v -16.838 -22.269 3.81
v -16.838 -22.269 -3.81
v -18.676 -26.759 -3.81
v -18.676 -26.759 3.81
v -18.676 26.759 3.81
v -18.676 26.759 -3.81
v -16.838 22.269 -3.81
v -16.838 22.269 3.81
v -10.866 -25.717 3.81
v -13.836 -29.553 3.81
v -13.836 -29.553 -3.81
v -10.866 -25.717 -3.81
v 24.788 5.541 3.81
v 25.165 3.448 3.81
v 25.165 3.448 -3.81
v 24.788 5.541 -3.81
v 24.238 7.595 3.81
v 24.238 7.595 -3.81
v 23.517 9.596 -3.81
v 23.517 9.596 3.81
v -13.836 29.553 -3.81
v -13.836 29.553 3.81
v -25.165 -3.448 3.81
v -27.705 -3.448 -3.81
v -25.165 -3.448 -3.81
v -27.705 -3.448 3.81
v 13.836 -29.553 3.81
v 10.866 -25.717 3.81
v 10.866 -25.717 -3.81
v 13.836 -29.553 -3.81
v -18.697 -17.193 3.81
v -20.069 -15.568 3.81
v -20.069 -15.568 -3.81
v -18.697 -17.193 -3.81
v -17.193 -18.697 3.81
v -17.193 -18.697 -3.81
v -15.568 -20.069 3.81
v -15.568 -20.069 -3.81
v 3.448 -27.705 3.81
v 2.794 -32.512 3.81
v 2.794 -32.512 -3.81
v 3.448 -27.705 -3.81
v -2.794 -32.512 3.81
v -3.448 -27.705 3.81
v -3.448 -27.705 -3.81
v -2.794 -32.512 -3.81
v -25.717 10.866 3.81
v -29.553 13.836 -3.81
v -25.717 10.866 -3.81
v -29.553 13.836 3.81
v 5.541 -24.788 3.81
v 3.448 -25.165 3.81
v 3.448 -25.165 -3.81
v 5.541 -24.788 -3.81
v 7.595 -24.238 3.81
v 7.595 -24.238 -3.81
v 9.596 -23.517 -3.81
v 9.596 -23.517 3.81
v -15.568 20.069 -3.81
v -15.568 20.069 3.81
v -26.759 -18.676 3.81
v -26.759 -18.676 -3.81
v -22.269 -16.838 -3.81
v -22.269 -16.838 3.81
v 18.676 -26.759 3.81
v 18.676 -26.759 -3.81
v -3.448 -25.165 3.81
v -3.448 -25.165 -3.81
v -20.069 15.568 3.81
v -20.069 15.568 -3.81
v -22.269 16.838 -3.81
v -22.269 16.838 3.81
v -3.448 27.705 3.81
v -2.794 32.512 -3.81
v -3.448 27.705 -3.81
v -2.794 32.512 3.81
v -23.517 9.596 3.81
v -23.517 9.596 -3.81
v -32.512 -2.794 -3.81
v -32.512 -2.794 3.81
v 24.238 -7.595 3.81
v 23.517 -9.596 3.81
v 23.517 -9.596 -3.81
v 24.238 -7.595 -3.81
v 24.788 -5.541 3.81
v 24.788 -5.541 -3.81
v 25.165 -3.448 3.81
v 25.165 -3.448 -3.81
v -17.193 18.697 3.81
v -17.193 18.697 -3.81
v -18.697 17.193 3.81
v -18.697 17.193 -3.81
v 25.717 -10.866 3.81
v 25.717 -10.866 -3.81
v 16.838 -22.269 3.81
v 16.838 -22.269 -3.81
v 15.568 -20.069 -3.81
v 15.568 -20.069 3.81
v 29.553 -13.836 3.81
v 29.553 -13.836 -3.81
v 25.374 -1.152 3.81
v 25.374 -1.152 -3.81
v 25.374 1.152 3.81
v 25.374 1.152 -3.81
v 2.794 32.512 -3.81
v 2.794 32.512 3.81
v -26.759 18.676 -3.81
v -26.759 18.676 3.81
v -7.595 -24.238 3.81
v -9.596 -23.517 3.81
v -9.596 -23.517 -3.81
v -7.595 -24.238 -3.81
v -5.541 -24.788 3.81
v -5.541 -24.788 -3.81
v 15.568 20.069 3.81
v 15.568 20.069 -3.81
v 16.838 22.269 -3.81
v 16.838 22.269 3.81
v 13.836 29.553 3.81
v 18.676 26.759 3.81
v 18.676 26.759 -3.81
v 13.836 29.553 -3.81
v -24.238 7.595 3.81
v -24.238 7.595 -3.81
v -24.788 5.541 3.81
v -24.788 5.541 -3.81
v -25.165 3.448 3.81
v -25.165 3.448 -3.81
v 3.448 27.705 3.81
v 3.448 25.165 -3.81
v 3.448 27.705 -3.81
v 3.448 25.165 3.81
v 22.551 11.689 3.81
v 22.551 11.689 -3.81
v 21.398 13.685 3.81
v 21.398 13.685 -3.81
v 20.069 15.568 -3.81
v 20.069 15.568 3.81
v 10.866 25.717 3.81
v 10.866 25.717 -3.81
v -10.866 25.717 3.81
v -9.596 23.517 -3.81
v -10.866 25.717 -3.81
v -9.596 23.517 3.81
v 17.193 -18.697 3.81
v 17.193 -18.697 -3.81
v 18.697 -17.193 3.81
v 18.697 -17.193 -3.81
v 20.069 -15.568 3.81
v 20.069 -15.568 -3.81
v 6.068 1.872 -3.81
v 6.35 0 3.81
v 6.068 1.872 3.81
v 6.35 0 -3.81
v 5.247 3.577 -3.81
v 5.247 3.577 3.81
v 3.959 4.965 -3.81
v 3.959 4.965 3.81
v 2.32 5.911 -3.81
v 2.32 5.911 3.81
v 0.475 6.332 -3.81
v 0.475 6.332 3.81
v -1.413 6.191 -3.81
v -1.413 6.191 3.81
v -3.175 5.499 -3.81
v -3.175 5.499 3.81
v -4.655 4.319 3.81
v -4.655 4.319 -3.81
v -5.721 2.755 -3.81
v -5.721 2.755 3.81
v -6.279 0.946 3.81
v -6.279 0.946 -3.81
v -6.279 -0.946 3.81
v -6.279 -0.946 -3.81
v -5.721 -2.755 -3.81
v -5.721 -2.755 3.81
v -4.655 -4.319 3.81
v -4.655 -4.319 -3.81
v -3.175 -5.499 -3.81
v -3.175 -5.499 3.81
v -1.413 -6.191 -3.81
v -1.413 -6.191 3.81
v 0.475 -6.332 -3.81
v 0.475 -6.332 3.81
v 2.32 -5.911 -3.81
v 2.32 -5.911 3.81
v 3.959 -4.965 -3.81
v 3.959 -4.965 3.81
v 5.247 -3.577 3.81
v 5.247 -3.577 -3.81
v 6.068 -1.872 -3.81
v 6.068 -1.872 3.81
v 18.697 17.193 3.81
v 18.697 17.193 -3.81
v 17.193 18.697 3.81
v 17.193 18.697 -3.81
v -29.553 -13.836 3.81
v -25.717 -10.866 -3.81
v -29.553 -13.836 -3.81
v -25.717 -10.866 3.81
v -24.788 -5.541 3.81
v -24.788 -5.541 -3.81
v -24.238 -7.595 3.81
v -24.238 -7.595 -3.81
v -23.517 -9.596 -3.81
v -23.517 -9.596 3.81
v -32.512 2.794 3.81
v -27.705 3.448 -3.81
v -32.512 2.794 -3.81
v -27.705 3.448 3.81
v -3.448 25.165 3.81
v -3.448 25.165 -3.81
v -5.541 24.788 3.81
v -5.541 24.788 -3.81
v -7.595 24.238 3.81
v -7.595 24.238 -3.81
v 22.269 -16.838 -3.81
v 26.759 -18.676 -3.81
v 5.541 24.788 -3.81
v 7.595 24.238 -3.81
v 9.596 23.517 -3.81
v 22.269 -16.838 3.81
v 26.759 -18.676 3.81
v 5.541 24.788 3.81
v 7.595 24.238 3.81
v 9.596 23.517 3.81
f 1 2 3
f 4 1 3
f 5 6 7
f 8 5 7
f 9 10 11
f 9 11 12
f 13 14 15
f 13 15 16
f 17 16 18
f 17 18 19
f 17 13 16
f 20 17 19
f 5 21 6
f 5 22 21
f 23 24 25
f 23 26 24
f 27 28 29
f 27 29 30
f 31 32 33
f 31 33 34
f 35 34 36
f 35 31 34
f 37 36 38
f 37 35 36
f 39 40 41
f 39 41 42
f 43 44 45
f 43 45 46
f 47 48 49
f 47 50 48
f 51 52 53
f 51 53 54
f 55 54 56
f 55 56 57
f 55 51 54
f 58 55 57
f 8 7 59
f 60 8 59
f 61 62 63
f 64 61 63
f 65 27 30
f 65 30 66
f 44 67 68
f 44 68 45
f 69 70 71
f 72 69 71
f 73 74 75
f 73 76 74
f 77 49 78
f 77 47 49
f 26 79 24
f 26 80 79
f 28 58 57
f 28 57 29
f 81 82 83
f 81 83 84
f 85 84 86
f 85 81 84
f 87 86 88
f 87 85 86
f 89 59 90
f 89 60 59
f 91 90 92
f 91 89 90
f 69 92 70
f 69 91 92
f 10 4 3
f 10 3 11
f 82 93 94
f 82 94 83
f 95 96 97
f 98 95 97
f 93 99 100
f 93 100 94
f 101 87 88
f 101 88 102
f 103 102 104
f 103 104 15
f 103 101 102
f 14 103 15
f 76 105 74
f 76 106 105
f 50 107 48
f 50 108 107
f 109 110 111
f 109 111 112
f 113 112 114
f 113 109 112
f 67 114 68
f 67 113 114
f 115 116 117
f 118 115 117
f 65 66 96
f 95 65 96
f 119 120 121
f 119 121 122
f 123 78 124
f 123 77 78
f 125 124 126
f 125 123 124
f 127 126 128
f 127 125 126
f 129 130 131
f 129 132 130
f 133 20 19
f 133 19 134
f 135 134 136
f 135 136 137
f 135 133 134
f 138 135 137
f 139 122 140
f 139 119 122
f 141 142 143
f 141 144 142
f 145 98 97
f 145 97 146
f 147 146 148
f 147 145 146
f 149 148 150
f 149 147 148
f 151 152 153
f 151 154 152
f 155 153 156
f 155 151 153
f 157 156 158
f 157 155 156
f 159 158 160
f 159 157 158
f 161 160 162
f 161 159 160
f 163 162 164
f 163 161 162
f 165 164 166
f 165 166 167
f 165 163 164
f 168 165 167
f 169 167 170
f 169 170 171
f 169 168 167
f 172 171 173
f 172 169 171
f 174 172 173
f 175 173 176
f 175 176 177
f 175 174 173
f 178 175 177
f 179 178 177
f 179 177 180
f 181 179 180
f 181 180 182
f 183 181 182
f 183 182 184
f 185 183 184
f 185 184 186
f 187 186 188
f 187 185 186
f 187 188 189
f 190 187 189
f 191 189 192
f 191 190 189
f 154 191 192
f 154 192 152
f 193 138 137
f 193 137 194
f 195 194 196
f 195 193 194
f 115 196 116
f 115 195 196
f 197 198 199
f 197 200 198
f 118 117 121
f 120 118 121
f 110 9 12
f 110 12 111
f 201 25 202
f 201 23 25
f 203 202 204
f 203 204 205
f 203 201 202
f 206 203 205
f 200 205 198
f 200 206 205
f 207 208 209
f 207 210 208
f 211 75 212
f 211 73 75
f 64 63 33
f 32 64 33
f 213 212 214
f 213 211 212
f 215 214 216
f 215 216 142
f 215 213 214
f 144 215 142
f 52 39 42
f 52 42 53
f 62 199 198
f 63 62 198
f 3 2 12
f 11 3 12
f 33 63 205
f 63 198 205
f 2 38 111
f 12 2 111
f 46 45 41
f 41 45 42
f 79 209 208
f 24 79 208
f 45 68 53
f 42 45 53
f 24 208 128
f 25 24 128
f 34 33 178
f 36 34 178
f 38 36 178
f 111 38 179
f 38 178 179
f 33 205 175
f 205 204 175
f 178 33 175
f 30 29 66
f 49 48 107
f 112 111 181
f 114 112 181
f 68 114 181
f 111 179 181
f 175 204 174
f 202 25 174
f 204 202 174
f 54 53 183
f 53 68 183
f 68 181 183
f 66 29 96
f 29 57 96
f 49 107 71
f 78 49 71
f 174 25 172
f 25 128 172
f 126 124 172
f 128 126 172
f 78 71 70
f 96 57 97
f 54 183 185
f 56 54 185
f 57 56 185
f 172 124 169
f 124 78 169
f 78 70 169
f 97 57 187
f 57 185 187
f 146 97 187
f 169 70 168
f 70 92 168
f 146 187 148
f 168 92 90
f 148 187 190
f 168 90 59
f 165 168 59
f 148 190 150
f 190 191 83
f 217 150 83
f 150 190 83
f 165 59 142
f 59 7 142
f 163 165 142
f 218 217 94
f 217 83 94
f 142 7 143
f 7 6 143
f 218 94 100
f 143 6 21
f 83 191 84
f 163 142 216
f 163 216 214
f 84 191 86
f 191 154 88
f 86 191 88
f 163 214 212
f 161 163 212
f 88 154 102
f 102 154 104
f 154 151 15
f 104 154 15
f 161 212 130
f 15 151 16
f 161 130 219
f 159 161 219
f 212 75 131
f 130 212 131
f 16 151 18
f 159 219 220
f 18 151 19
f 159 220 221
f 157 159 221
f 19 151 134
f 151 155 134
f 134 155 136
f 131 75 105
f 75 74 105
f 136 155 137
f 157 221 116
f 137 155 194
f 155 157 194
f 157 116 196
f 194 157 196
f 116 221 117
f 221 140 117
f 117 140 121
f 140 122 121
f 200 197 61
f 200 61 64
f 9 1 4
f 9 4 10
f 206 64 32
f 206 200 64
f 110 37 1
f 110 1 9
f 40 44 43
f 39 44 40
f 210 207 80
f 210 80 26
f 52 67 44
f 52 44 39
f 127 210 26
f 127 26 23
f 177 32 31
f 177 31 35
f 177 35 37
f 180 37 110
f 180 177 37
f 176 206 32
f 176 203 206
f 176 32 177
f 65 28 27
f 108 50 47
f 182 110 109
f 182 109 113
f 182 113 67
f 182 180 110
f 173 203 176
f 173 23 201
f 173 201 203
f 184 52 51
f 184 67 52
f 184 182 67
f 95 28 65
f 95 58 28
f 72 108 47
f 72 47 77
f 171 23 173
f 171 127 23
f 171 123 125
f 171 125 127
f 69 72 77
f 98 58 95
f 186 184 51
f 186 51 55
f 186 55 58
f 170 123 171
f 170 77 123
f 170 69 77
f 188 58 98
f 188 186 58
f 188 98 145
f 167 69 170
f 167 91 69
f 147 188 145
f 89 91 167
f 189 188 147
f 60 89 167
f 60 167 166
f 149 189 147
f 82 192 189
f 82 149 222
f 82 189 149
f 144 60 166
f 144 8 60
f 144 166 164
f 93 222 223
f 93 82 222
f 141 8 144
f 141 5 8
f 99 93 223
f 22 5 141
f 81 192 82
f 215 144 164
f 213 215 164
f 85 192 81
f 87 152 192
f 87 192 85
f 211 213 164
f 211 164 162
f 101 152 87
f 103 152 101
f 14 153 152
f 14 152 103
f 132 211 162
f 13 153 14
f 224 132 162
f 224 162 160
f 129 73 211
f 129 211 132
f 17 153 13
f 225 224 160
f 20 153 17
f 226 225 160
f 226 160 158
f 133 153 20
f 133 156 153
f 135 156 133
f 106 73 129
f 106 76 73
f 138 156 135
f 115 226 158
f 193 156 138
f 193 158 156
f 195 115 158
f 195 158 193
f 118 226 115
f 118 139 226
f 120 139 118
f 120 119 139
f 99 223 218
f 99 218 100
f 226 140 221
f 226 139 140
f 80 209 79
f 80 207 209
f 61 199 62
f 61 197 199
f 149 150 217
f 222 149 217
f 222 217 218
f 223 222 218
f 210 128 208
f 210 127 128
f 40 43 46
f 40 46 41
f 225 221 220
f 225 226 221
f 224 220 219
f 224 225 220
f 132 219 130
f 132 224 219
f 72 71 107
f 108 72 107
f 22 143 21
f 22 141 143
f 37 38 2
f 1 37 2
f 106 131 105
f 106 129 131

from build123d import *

# Parameters (mm, degrees)
F0_R     = 6.35
F1_DEPTH = 3.81


with BuildPart() as f1:
    # F0 (on Top) → F1 (new body, symmetric)
    with BuildSketch(Plane.XY):
        with BuildLine():
            Line((-22.269135, -16.838492), (-20.069431, -15.568492))
            ThreePointArc((-20.069431, -15.568492), (-17.960512, -17.960512), (-15.568492, -20.069431))
            Line((-15.568492, -20.069431), (-16.838492, -22.269135))
            Line((-16.838492, -22.269135), (-18.675675, -26.759218))
            Line((-18.675675, -26.759218), (-16.256, -28.156218))
            Line((-16.256, -28.156218), (-13.836325, -29.553218))
            Line((-13.836325, -29.553218), (-10.866391, -25.71713))
            Line((-10.866391, -25.71713), (-9.596391, -23.517425))
            ThreePointArc((-9.596391, -23.517425), (-6.574004, -24.534516), (-3.447994, -25.164883))
            Line((-3.447994, -25.164883), (-3.447994, -27.704883))
            Line((-3.447994, -27.704883), (-2.794, -32.512))
            Line((-2.794, -32.512), (0, -32.512))
            Line((0, -32.512), (2.794, -32.512))
            Line((2.794, -32.512), (3.447994, -27.704883))
            Line((3.447994, -27.704883), (3.447994, -25.164883))
            ThreePointArc((3.447994, -25.164883), (6.574004, -24.534516), (9.596391, -23.517425))
            Line((9.596391, -23.517425), (10.866391, -25.71713))
            Line((10.866391, -25.71713), (13.836325, -29.553218))
            Line((13.836325, -29.553218), (16.256, -28.156218))
            Line((16.256, -28.156218), (18.675675, -26.759218))
            Line((18.675675, -26.759218), (16.838492, -22.269135))
            Line((16.838492, -22.269135), (15.568492, -20.069431))
            ThreePointArc((15.568492, -20.069431), (17.960512, -17.960512), (20.069431, -15.568492))
            Line((20.069431, -15.568492), (22.269135, -16.838492))
            Line((22.269135, -16.838492), (26.759218, -18.675675))
            Line((26.759218, -18.675675), (28.156218, -16.256))
            Line((28.156218, -16.256), (29.553218, -13.836325))
            Line((29.553218, -13.836325), (25.71713, -10.866391))
            Line((25.71713, -10.866391), (23.517425, -9.596391))
            ThreePointArc((23.517425, -9.596391), (24.534516, -6.574004), (25.164883, -3.447994))
            ThreePointArc((25.164883, -3.447994), (25.4, 0), (25.164883, 3.447994))
            ThreePointArc((25.164883, 3.447994), (24.534516, 6.574004), (23.517425, 9.596391))
            ThreePointArc((23.517425, 9.596391), (21.997045, 12.7), (20.069431, 15.568492))
            ThreePointArc((20.069431, 15.568492), (17.960512, 17.960512), (15.568492, 20.069431))
            Line((15.568492, 20.069431), (16.838492, 22.269135))
            Line((16.838492, 22.269135), (18.675675, 26.759218))
            Line((18.675675, 26.759218), (16.256, 28.156218))
            Line((16.256, 28.156218), (13.836325, 29.553218))
            Line((13.836325, 29.553218), (10.866391, 25.71713))
            Line((10.866391, 25.71713), (9.596391, 23.517425))
            ThreePointArc((9.596391, 23.517425), (6.574004, 24.534516), (3.447994, 25.164883))
            Line((3.447994, 25.164883), (3.447994, 27.704883))
            Line((3.447994, 27.704883), (2.794, 32.512))
            Line((2.794, 32.512), (0, 32.512))
            Line((0, 32.512), (-2.794, 32.512))
            Line((-2.794, 32.512), (-3.447994, 27.704883))
            Line((-3.447994, 27.704883), (-3.447994, 25.164883))
            ThreePointArc((-3.447994, 25.164883), (-6.574004, 24.534516), (-9.596391, 23.517425))
            Line((-9.596391, 23.517425), (-10.866391, 25.71713))
            Line((-10.866391, 25.71713), (-13.836325, 29.553218))
            Line((-13.836325, 29.553218), (-16.256, 28.156218))
            Line((-16.256, 28.156218), (-18.675675, 26.759218))
            Line((-18.675675, 26.759218), (-16.838492, 22.269135))
            Line((-16.838492, 22.269135), (-15.568492, 20.069431))
            ThreePointArc((-15.568492, 20.069431), (-17.960512, 17.960512), (-20.069431, 15.568492))
            Line((-20.069431, 15.568492), (-22.269135, 16.838492))
            Line((-22.269135, 16.838492), (-26.759218, 18.675675))
            Line((-26.759218, 18.675675), (-28.156218, 16.256))
            Line((-28.156218, 16.256), (-29.553218, 13.836325))
            Line((-29.553218, 13.836325), (-25.71713, 10.866391))
            Line((-25.71713, 10.866391), (-23.517425, 9.596391))
            ThreePointArc((-23.517425, 9.596391), (-24.534516, 6.574004), (-25.164883, 3.447994))
            Line((-25.164883, 3.447994), (-27.704883, 3.447994))
            Line((-27.704883, 3.447994), (-32.512, 2.794))
            Line((-32.512, 2.794), (-32.512, 0))
            Line((-32.512, 0), (-32.512, -2.794))
            Line((-32.512, -2.794), (-27.704883, -3.447994))
            Line((-27.704883, -3.447994), (-25.164883, -3.447994))
            ThreePointArc((-25.164883, -3.447994), (-24.534516, -6.574004), (-23.517425, -9.596391))
            Line((-23.517425, -9.596391), (-25.71713, -10.866391))
            Line((-25.71713, -10.866391), (-29.553218, -13.836325))
            Line((-29.553218, -13.836325), (-28.156218, -16.256))
            Line((-28.156218, -16.256), (-26.759218, -18.675675))
            Line((-26.759218, -18.675675), (-22.269135, -16.838492))
        make_face()
        Circle(F0_R, mode=Mode.SUBTRACT)
    extrude(amount=F1_DEPTH, both=True)


solid = f1.part
